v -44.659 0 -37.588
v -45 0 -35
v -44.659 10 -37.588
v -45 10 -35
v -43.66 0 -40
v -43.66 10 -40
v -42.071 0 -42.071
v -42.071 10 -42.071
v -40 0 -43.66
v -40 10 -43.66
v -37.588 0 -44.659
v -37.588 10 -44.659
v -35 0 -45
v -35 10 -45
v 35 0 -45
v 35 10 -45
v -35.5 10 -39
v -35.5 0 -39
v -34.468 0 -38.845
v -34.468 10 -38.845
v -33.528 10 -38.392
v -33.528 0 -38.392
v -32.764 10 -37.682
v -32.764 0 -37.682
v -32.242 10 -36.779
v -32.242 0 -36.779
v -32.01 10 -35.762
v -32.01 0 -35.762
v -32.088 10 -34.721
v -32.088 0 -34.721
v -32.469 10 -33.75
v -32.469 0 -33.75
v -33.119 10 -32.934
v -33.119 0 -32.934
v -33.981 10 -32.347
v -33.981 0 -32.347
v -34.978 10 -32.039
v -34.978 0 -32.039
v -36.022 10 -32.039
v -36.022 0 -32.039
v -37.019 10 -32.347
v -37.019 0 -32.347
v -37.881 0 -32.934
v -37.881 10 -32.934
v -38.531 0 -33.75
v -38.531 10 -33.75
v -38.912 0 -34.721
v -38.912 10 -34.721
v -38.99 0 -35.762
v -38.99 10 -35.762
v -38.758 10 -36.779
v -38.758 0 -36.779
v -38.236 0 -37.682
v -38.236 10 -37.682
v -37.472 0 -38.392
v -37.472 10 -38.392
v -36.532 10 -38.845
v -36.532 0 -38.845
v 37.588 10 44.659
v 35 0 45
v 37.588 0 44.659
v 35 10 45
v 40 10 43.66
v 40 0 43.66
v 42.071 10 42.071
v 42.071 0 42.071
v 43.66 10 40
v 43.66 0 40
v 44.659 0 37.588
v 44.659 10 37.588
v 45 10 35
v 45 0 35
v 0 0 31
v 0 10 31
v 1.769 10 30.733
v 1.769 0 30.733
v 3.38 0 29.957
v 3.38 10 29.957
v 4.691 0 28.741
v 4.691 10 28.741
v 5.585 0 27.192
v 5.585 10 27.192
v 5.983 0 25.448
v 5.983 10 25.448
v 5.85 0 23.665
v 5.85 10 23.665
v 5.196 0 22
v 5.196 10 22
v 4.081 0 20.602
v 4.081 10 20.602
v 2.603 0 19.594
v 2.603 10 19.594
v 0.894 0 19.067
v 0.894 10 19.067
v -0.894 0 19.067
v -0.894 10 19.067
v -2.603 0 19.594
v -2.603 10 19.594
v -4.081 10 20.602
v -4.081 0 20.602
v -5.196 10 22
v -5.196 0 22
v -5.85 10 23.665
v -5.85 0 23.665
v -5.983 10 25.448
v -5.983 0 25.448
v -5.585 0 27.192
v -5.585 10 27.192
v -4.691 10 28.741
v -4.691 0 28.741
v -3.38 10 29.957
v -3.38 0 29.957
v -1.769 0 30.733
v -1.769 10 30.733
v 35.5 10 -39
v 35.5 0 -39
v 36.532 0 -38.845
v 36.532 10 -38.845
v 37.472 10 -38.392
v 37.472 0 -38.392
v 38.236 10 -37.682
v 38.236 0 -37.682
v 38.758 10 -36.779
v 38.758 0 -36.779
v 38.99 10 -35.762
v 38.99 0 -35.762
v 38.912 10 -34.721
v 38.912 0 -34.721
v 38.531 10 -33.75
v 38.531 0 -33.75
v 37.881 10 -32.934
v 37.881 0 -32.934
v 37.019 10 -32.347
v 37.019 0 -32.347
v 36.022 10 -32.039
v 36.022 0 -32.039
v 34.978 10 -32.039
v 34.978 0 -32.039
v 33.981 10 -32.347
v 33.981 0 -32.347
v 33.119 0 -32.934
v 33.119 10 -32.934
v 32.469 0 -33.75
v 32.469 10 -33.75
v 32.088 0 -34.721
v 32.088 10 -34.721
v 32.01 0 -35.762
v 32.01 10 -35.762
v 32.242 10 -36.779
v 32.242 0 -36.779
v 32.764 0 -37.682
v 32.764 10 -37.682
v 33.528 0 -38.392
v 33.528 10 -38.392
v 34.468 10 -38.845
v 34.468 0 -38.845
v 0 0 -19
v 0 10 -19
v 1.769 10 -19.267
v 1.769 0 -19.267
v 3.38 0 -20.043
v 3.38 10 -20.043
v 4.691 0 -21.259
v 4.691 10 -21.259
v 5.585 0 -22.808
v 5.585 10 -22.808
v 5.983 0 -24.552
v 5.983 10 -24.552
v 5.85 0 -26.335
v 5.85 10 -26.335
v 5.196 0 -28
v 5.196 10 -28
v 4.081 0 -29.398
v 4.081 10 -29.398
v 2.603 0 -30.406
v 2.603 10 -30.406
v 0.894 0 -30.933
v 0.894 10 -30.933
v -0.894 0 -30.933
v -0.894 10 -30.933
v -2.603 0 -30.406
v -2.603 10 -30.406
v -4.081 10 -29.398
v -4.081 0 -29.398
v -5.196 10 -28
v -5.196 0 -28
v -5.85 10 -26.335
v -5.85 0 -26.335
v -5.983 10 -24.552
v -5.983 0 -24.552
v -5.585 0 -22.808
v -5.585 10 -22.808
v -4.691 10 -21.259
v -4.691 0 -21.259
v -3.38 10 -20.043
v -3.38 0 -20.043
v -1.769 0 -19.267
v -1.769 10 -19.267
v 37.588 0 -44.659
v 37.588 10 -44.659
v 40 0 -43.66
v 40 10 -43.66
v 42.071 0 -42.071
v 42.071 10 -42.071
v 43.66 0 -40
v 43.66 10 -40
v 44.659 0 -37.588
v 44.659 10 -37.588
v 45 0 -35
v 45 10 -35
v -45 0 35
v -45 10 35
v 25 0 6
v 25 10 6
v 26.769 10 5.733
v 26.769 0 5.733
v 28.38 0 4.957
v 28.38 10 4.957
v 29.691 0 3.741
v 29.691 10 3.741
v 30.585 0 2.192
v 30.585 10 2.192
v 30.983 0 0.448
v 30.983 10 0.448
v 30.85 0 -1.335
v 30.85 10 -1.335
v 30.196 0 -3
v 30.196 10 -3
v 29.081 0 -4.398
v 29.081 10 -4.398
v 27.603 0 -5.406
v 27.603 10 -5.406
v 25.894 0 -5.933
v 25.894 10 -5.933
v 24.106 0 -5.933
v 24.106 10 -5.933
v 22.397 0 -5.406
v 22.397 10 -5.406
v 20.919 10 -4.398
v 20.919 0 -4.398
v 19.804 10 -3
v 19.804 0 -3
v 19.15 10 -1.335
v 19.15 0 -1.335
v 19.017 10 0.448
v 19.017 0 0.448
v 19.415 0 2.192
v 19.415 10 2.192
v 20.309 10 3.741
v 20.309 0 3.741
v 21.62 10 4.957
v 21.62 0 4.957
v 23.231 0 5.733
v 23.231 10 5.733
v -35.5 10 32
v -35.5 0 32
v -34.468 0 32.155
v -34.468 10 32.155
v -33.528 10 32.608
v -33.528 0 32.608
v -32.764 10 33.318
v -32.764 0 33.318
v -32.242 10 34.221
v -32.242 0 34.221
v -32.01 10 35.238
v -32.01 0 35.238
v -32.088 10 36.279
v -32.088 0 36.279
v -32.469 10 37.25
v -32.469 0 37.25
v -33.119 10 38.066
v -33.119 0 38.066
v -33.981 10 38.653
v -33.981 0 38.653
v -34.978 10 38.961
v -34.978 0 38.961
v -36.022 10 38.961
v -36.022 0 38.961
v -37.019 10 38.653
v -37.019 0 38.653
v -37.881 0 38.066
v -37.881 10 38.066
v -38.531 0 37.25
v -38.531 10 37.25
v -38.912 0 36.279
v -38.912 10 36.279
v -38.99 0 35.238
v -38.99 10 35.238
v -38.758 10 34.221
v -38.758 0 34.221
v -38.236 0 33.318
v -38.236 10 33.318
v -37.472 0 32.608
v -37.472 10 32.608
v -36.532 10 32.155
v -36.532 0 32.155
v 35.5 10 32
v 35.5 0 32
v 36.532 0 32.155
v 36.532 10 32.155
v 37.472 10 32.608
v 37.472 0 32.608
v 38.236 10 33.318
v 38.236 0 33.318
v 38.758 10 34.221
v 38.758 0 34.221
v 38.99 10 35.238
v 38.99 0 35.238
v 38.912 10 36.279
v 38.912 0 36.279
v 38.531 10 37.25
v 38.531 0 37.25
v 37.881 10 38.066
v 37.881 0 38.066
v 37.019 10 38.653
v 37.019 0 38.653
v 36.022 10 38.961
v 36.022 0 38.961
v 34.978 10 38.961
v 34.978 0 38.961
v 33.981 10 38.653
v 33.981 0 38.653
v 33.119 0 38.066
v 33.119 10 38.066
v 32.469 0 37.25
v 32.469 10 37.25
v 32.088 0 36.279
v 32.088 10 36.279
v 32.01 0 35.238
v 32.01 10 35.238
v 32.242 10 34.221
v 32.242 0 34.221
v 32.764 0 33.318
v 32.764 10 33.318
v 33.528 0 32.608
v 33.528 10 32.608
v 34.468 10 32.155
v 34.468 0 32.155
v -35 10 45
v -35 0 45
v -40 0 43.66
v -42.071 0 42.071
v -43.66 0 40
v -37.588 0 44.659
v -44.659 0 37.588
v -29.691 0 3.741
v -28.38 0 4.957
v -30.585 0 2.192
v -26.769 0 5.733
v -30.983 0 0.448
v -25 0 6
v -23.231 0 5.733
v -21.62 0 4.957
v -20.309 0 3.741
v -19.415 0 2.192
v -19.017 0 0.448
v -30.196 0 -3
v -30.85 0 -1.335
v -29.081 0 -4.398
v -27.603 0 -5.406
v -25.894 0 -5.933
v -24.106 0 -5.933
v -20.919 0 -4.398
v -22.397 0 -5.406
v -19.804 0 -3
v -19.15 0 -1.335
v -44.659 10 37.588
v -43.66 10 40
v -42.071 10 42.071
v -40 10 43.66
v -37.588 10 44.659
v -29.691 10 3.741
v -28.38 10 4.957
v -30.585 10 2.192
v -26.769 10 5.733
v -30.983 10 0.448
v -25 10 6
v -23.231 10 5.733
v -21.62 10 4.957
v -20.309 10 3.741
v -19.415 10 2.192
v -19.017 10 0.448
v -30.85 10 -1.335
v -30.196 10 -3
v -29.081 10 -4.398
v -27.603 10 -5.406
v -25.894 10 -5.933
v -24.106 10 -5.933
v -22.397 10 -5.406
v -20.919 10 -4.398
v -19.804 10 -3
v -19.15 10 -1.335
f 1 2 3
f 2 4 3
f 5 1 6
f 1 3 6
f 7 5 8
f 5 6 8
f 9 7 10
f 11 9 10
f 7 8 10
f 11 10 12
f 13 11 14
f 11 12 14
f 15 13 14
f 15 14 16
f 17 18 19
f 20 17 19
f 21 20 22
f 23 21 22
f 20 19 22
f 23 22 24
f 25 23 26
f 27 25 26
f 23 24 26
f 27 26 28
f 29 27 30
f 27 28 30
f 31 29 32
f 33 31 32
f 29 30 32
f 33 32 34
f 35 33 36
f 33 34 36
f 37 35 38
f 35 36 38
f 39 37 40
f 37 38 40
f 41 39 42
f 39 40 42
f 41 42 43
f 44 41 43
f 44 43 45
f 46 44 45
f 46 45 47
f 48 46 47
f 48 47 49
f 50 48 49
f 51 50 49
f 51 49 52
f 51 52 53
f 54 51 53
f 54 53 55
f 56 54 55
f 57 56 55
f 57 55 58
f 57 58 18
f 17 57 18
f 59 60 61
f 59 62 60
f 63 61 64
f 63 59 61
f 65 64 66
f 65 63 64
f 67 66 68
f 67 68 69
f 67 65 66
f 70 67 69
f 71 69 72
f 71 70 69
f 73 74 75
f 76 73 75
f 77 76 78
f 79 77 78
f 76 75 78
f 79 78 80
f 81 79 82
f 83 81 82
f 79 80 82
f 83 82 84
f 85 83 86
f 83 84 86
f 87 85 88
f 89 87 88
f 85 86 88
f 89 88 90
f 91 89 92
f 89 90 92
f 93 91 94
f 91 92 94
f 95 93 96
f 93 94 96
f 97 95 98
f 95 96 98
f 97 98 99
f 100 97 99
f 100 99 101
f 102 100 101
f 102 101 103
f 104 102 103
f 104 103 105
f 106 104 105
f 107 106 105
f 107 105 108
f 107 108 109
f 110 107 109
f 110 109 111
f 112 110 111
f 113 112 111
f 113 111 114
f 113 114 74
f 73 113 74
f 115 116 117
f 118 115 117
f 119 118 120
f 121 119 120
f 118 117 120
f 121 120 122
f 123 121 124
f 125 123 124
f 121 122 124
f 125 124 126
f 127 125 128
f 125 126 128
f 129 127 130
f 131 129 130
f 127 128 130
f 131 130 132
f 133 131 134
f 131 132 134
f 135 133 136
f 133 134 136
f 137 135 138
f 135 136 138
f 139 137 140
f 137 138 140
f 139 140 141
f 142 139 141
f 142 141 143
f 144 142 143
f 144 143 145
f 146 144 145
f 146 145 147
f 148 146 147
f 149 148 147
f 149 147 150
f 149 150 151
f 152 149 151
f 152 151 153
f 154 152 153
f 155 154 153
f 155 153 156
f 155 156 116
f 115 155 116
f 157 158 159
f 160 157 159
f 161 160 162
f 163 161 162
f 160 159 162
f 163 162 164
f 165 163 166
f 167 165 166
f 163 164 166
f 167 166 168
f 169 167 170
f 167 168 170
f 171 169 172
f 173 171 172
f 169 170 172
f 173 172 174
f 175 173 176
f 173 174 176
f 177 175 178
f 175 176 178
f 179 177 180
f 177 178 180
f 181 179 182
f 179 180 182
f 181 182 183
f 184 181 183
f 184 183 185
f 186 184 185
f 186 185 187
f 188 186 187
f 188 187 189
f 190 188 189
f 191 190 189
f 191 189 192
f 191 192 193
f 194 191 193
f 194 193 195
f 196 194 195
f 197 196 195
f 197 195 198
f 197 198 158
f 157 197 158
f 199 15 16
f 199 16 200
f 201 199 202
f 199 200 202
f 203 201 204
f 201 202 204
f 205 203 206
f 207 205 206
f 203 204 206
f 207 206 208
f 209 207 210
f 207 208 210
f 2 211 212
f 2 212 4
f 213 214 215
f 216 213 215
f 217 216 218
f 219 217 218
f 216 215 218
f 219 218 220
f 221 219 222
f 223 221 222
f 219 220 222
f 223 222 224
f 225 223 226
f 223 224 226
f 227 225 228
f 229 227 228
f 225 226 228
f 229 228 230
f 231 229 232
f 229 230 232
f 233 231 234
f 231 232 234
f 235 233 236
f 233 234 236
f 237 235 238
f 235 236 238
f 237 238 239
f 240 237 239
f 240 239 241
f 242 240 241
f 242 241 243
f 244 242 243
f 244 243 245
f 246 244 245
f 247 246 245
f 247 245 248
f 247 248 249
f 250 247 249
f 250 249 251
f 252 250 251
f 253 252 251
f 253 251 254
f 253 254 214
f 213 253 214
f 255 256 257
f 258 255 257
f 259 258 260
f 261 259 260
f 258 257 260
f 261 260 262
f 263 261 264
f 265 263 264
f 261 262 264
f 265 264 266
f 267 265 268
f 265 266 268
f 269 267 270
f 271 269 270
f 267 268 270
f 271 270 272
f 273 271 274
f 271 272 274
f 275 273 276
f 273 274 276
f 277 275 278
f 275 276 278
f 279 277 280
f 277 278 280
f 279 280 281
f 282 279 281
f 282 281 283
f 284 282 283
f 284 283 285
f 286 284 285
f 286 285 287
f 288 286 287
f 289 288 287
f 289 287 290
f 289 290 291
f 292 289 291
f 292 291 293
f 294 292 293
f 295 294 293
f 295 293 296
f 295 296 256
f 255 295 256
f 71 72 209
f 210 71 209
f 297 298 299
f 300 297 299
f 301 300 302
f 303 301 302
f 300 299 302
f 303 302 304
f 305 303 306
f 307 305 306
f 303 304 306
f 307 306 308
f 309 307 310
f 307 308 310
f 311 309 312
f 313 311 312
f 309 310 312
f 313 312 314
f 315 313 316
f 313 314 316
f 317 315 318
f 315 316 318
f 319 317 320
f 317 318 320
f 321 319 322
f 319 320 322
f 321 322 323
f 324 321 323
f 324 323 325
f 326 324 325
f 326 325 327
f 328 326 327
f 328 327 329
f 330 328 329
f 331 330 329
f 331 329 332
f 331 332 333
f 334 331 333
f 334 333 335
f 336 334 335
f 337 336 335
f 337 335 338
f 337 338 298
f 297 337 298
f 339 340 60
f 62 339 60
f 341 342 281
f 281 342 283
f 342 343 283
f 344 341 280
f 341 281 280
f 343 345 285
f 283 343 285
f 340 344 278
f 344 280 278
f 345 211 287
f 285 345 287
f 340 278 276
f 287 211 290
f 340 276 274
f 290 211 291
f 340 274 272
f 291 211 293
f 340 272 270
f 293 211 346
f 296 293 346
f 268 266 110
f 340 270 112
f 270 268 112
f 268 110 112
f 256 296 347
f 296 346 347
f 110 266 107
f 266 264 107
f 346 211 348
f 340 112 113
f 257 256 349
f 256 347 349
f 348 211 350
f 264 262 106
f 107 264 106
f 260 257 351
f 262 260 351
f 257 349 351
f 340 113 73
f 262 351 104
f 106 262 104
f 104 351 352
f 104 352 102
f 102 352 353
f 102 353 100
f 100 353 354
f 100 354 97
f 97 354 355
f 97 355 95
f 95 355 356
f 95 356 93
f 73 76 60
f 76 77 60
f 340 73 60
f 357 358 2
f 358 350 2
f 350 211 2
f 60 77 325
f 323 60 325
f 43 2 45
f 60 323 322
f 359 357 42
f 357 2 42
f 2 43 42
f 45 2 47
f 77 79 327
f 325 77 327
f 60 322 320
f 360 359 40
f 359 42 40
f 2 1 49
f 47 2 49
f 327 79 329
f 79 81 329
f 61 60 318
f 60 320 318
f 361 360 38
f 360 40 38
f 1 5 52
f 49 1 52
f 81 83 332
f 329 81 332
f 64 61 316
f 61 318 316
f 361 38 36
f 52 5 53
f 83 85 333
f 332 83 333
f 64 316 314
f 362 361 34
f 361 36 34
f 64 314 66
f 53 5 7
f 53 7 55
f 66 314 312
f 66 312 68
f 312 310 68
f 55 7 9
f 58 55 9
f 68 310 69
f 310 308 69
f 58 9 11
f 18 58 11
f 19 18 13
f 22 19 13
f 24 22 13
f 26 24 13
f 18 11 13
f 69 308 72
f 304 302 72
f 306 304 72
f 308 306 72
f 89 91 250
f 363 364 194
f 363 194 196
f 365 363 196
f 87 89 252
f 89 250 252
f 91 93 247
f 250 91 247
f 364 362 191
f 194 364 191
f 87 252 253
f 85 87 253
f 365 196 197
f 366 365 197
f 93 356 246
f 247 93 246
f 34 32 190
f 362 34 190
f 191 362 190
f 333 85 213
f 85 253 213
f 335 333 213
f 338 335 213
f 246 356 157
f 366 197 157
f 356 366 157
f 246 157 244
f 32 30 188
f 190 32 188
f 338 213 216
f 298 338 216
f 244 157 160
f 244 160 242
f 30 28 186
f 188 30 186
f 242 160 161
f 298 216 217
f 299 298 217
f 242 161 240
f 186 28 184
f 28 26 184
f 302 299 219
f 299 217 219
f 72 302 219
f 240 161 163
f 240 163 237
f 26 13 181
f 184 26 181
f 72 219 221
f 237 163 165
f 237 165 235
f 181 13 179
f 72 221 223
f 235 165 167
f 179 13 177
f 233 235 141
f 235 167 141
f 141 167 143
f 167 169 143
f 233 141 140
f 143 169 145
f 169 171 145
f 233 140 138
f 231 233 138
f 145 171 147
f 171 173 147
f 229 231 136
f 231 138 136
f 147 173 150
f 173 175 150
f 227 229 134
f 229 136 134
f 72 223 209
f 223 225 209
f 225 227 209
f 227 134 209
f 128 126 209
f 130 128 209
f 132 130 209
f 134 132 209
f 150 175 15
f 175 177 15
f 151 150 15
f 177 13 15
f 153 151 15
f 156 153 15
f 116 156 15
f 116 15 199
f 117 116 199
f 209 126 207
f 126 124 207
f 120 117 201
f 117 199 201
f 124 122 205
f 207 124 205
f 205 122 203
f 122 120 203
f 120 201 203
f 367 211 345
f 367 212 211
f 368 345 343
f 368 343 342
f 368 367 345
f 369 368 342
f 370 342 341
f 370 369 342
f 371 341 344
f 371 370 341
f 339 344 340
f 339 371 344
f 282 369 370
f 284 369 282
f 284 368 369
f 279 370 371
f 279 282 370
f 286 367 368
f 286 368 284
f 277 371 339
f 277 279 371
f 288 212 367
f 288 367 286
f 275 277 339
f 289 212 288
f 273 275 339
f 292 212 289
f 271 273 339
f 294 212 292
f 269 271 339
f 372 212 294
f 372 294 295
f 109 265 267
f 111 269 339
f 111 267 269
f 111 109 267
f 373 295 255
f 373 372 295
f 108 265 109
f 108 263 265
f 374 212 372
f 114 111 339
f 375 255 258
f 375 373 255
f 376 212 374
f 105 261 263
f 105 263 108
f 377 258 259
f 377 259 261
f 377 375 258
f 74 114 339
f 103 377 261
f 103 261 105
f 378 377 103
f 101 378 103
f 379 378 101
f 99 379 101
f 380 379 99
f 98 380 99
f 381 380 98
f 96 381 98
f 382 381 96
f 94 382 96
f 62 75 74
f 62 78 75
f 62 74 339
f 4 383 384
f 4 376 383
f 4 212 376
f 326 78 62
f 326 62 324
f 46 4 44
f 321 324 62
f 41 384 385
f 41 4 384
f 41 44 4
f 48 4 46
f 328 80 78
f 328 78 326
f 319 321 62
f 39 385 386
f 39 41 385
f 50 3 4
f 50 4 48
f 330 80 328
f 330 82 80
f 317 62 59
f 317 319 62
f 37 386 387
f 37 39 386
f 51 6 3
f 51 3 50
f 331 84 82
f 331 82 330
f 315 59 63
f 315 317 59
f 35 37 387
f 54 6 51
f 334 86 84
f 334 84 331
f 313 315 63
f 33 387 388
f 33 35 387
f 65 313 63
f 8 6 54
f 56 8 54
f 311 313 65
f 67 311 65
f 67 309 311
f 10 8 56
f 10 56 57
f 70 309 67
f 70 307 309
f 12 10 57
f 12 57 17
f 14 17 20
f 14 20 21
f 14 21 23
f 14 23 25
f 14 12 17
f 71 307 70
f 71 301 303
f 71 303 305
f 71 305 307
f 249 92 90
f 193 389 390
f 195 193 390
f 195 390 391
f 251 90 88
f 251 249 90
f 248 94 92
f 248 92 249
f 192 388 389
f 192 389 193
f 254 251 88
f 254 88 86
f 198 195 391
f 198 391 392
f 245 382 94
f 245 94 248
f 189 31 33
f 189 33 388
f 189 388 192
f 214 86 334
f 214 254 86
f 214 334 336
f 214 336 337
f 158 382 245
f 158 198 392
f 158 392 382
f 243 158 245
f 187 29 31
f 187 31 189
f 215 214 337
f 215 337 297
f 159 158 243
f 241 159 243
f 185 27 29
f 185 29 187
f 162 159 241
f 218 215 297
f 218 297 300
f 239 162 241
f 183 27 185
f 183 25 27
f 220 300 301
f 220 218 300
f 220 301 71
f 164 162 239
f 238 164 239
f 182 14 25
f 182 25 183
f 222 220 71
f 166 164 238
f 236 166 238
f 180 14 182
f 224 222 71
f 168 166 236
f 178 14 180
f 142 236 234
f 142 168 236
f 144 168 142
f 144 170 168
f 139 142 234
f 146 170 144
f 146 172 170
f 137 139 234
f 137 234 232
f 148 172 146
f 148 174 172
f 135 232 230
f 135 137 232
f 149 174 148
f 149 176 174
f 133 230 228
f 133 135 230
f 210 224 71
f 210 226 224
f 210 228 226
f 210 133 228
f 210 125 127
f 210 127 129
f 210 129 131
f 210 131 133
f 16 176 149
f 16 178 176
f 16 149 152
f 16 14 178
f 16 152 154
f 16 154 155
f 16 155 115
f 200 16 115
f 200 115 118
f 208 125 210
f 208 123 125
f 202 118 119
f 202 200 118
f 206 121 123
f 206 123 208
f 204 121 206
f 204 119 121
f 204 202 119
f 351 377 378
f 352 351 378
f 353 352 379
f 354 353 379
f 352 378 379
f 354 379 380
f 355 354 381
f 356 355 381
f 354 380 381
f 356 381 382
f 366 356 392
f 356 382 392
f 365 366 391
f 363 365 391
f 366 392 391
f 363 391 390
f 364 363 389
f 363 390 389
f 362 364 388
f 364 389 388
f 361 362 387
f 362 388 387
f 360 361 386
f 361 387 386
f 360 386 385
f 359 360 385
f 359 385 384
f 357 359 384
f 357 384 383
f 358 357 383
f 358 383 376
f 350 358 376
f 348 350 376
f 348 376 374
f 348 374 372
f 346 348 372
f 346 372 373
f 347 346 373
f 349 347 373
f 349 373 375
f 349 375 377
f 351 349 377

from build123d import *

# Parameters (mm, degrees)
SKETCH1_W            = 90
SKETCH1_H            = 90
BOSS_EXTRUDE1_DEPTH  = 10
M6_CLEARANCE_HOLE2_D = 7
SKETCH3_R            = 6
CUT_EXTRUDE2_DEPTH   = 26
FILLET1_R            = 10


with BuildPart() as part:
    # Sketch1 → Boss-Extrude1 (new body)
    with BuildSketch(Plane(origin=(0, 0, 0), x_dir=(1, 0, 0), z_dir=(0, 1, 0))):
        Rectangle(SKETCH1_W, SKETCH1_H)
    extrude(amount=BOSS_EXTRUDE1_DEPTH)

    # M6 Clearance Hole2 (through all)
    with Locations(Plane(origin=(-35.5, 10, -35.5), x_dir=(0, 0, 1), z_dir=(0, 1, 0))):
        with Locations((0, 0), (0, 71), (71, 0), (71, 71)):
            Hole(M6_CLEARANCE_HOLE2_D / 2)

    # Sketch3 → Cut-Extrude2 (cut)
    with BuildSketch(Plane(origin=(0, 10, 0), x_dir=(1, 0, 0), z_dir=(0, 1, 0))):
        with Locations(Location((0, 25, 0), (0, 0, 270))):
            Circle(SKETCH3_R)
        with Locations(Location((-25, 0, 0), (0, 0, 270))):
            Circle(SKETCH3_R)
        with Locations(Location((0, -25, 0), (0, 0, 270))):
            Circle(SKETCH3_R)
        with Locations(Location((25, 0, 0), (0, 0, 270))):
            Circle(SKETCH3_R)
    extrude(amount=-CUT_EXTRUDE2_DEPTH, mode=Mode.SUBTRACT)

    # Fillet1
    fillet1_edges = [part.edges().sort_by_distance(p)[0] for p in [
        (45, 5, 45),
        (-45, 5, 45),
        (-45, 5, -45),
        (45, 5, -45),
    ]]
    fillet(fillet1_edges, radius=FILLET1_R)


solid = part.part
